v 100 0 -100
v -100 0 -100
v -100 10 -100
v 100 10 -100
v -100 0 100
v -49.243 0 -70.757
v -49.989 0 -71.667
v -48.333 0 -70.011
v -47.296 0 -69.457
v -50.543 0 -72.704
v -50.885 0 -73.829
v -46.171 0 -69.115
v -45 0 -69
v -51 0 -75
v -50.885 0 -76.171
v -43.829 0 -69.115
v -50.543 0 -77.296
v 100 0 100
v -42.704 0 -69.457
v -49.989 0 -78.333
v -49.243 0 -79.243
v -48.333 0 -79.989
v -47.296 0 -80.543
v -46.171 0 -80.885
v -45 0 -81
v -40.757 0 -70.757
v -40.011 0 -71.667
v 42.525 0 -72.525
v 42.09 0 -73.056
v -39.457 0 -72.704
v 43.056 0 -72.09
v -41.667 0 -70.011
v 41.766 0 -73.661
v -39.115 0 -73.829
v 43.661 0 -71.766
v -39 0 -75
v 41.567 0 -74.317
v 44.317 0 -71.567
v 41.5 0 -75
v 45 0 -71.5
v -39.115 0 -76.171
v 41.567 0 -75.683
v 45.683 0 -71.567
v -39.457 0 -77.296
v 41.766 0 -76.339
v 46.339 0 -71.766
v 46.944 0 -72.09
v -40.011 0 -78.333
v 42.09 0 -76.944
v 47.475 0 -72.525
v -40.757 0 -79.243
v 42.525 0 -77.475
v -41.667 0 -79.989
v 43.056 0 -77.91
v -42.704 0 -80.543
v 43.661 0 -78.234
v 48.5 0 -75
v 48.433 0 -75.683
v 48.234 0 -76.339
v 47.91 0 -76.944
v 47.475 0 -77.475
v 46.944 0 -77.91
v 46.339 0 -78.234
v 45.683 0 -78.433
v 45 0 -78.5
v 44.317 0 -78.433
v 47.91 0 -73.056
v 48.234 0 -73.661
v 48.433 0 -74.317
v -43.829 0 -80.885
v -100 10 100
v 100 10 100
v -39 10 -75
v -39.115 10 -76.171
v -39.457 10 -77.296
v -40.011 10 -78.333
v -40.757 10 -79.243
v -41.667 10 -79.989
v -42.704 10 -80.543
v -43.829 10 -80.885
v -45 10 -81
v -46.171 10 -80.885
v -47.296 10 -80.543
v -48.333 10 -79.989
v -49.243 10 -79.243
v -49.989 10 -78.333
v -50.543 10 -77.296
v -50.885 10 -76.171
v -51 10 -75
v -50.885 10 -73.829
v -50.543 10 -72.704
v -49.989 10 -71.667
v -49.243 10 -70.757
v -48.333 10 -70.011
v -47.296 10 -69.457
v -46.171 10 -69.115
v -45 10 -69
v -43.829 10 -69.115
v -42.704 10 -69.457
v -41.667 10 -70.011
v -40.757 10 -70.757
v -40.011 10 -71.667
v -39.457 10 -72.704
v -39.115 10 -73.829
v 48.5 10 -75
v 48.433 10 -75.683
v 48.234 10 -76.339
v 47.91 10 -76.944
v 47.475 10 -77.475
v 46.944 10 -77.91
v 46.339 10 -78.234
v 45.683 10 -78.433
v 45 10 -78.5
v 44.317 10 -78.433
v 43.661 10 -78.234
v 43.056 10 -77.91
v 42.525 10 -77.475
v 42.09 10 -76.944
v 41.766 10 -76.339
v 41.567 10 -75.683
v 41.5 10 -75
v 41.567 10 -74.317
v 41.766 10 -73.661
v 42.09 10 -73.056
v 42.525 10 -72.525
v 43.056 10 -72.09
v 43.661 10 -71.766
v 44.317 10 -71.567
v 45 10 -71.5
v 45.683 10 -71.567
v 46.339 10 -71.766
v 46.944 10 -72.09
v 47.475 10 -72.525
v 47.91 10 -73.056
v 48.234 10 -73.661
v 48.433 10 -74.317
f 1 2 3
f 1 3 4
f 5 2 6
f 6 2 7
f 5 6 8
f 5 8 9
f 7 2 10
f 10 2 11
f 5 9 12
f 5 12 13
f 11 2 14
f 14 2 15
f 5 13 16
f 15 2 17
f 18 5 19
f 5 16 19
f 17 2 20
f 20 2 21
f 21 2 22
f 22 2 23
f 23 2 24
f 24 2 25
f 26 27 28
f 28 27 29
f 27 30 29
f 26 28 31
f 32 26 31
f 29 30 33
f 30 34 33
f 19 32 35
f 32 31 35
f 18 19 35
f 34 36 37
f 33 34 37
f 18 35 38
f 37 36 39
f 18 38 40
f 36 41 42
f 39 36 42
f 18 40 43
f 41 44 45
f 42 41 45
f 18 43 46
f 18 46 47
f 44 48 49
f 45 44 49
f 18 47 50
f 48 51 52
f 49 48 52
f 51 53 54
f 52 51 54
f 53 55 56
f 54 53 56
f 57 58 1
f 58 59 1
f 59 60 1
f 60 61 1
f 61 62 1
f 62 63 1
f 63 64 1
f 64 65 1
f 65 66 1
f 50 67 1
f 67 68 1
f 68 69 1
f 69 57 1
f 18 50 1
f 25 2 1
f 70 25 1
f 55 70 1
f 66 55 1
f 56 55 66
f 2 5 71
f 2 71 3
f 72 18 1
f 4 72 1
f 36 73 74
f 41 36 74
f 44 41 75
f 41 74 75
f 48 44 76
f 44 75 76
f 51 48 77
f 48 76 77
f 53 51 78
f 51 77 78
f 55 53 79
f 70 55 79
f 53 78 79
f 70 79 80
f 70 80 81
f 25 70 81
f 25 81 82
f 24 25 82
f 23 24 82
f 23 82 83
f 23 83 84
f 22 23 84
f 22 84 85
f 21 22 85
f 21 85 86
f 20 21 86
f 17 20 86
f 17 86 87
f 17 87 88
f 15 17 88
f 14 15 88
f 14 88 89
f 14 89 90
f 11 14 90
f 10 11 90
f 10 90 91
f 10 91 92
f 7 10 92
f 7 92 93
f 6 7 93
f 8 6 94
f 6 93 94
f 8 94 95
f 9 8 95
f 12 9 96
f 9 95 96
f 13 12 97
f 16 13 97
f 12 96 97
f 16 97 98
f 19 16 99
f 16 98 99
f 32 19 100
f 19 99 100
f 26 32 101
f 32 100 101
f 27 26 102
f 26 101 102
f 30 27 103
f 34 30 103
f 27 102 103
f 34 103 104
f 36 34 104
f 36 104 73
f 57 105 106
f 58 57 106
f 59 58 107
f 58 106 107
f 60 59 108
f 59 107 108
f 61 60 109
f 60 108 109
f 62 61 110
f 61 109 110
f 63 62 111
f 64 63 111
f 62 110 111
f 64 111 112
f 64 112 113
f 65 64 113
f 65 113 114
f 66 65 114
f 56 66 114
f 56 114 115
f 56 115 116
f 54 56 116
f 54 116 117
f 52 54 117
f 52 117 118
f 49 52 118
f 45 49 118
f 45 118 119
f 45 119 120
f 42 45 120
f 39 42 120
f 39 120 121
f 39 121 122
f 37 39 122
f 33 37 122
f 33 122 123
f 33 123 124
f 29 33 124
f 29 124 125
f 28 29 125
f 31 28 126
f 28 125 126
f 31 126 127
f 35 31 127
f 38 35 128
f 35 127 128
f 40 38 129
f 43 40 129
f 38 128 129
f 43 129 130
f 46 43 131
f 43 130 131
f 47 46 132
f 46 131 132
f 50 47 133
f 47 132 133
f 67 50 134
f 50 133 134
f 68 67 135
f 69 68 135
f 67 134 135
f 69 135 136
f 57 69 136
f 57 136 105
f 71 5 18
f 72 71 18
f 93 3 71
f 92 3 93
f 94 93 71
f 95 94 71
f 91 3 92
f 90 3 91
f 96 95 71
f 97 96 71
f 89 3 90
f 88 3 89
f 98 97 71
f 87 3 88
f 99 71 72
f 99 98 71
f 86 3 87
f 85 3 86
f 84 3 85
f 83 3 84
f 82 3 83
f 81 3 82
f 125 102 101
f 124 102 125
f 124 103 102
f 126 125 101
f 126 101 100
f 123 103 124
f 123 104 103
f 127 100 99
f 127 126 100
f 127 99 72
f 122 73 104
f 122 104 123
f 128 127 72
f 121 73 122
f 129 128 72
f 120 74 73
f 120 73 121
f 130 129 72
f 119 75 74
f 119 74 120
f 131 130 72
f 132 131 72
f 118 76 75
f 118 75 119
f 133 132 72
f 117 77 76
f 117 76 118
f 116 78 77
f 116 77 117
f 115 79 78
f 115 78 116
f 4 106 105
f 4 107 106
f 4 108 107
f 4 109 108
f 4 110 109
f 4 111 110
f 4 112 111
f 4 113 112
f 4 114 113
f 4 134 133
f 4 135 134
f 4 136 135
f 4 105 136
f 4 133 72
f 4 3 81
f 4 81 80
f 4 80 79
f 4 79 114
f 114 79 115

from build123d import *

# Parameters (mm, degrees)
SKETCH1_W           = 200
SKETCH1_H           = 200
BOSS_EXTRUDE1_DEPTH = 10
SKETCH2_R           = 3.5
CUT_EXTRUDE1_DEPTH  = 11
SKETCH3_R           = 6
CUT_EXTRUDE2_DEPTH  = 11


with BuildPart() as part:
    # Sketch1 → Boss-Extrude1 (new body)
    with BuildSketch(Plane(origin=(0, 0, 0), x_dir=(1, 0, 0), z_dir=(0, 1, 0))):
        Rectangle(SKETCH1_W, SKETCH1_H)
    extrude(amount=BOSS_EXTRUDE1_DEPTH)

    # Sketch2 → Cut-Extrude1 (cut, through all)
    with BuildSketch(Plane(origin=(0, 10, 0), x_dir=(1, 0, 0), z_dir=(0, 1, 0))):
        with Locations((45, 75)):
            Circle(SKETCH2_R)
    extrude(amount=-CUT_EXTRUDE1_DEPTH, mode=Mode.SUBTRACT)

    # Sketch3 → Cut-Extrude2 (cut, through all)
    with BuildSketch(Plane(origin=(0, 10, 0), x_dir=(1, 0, 0), z_dir=(0, 1, 0))):
        with Locations((-45, 75)):
            Circle(SKETCH3_R)
    extrude(amount=-CUT_EXTRUDE2_DEPTH, mode=Mode.SUBTRACT)


solid = part.part
